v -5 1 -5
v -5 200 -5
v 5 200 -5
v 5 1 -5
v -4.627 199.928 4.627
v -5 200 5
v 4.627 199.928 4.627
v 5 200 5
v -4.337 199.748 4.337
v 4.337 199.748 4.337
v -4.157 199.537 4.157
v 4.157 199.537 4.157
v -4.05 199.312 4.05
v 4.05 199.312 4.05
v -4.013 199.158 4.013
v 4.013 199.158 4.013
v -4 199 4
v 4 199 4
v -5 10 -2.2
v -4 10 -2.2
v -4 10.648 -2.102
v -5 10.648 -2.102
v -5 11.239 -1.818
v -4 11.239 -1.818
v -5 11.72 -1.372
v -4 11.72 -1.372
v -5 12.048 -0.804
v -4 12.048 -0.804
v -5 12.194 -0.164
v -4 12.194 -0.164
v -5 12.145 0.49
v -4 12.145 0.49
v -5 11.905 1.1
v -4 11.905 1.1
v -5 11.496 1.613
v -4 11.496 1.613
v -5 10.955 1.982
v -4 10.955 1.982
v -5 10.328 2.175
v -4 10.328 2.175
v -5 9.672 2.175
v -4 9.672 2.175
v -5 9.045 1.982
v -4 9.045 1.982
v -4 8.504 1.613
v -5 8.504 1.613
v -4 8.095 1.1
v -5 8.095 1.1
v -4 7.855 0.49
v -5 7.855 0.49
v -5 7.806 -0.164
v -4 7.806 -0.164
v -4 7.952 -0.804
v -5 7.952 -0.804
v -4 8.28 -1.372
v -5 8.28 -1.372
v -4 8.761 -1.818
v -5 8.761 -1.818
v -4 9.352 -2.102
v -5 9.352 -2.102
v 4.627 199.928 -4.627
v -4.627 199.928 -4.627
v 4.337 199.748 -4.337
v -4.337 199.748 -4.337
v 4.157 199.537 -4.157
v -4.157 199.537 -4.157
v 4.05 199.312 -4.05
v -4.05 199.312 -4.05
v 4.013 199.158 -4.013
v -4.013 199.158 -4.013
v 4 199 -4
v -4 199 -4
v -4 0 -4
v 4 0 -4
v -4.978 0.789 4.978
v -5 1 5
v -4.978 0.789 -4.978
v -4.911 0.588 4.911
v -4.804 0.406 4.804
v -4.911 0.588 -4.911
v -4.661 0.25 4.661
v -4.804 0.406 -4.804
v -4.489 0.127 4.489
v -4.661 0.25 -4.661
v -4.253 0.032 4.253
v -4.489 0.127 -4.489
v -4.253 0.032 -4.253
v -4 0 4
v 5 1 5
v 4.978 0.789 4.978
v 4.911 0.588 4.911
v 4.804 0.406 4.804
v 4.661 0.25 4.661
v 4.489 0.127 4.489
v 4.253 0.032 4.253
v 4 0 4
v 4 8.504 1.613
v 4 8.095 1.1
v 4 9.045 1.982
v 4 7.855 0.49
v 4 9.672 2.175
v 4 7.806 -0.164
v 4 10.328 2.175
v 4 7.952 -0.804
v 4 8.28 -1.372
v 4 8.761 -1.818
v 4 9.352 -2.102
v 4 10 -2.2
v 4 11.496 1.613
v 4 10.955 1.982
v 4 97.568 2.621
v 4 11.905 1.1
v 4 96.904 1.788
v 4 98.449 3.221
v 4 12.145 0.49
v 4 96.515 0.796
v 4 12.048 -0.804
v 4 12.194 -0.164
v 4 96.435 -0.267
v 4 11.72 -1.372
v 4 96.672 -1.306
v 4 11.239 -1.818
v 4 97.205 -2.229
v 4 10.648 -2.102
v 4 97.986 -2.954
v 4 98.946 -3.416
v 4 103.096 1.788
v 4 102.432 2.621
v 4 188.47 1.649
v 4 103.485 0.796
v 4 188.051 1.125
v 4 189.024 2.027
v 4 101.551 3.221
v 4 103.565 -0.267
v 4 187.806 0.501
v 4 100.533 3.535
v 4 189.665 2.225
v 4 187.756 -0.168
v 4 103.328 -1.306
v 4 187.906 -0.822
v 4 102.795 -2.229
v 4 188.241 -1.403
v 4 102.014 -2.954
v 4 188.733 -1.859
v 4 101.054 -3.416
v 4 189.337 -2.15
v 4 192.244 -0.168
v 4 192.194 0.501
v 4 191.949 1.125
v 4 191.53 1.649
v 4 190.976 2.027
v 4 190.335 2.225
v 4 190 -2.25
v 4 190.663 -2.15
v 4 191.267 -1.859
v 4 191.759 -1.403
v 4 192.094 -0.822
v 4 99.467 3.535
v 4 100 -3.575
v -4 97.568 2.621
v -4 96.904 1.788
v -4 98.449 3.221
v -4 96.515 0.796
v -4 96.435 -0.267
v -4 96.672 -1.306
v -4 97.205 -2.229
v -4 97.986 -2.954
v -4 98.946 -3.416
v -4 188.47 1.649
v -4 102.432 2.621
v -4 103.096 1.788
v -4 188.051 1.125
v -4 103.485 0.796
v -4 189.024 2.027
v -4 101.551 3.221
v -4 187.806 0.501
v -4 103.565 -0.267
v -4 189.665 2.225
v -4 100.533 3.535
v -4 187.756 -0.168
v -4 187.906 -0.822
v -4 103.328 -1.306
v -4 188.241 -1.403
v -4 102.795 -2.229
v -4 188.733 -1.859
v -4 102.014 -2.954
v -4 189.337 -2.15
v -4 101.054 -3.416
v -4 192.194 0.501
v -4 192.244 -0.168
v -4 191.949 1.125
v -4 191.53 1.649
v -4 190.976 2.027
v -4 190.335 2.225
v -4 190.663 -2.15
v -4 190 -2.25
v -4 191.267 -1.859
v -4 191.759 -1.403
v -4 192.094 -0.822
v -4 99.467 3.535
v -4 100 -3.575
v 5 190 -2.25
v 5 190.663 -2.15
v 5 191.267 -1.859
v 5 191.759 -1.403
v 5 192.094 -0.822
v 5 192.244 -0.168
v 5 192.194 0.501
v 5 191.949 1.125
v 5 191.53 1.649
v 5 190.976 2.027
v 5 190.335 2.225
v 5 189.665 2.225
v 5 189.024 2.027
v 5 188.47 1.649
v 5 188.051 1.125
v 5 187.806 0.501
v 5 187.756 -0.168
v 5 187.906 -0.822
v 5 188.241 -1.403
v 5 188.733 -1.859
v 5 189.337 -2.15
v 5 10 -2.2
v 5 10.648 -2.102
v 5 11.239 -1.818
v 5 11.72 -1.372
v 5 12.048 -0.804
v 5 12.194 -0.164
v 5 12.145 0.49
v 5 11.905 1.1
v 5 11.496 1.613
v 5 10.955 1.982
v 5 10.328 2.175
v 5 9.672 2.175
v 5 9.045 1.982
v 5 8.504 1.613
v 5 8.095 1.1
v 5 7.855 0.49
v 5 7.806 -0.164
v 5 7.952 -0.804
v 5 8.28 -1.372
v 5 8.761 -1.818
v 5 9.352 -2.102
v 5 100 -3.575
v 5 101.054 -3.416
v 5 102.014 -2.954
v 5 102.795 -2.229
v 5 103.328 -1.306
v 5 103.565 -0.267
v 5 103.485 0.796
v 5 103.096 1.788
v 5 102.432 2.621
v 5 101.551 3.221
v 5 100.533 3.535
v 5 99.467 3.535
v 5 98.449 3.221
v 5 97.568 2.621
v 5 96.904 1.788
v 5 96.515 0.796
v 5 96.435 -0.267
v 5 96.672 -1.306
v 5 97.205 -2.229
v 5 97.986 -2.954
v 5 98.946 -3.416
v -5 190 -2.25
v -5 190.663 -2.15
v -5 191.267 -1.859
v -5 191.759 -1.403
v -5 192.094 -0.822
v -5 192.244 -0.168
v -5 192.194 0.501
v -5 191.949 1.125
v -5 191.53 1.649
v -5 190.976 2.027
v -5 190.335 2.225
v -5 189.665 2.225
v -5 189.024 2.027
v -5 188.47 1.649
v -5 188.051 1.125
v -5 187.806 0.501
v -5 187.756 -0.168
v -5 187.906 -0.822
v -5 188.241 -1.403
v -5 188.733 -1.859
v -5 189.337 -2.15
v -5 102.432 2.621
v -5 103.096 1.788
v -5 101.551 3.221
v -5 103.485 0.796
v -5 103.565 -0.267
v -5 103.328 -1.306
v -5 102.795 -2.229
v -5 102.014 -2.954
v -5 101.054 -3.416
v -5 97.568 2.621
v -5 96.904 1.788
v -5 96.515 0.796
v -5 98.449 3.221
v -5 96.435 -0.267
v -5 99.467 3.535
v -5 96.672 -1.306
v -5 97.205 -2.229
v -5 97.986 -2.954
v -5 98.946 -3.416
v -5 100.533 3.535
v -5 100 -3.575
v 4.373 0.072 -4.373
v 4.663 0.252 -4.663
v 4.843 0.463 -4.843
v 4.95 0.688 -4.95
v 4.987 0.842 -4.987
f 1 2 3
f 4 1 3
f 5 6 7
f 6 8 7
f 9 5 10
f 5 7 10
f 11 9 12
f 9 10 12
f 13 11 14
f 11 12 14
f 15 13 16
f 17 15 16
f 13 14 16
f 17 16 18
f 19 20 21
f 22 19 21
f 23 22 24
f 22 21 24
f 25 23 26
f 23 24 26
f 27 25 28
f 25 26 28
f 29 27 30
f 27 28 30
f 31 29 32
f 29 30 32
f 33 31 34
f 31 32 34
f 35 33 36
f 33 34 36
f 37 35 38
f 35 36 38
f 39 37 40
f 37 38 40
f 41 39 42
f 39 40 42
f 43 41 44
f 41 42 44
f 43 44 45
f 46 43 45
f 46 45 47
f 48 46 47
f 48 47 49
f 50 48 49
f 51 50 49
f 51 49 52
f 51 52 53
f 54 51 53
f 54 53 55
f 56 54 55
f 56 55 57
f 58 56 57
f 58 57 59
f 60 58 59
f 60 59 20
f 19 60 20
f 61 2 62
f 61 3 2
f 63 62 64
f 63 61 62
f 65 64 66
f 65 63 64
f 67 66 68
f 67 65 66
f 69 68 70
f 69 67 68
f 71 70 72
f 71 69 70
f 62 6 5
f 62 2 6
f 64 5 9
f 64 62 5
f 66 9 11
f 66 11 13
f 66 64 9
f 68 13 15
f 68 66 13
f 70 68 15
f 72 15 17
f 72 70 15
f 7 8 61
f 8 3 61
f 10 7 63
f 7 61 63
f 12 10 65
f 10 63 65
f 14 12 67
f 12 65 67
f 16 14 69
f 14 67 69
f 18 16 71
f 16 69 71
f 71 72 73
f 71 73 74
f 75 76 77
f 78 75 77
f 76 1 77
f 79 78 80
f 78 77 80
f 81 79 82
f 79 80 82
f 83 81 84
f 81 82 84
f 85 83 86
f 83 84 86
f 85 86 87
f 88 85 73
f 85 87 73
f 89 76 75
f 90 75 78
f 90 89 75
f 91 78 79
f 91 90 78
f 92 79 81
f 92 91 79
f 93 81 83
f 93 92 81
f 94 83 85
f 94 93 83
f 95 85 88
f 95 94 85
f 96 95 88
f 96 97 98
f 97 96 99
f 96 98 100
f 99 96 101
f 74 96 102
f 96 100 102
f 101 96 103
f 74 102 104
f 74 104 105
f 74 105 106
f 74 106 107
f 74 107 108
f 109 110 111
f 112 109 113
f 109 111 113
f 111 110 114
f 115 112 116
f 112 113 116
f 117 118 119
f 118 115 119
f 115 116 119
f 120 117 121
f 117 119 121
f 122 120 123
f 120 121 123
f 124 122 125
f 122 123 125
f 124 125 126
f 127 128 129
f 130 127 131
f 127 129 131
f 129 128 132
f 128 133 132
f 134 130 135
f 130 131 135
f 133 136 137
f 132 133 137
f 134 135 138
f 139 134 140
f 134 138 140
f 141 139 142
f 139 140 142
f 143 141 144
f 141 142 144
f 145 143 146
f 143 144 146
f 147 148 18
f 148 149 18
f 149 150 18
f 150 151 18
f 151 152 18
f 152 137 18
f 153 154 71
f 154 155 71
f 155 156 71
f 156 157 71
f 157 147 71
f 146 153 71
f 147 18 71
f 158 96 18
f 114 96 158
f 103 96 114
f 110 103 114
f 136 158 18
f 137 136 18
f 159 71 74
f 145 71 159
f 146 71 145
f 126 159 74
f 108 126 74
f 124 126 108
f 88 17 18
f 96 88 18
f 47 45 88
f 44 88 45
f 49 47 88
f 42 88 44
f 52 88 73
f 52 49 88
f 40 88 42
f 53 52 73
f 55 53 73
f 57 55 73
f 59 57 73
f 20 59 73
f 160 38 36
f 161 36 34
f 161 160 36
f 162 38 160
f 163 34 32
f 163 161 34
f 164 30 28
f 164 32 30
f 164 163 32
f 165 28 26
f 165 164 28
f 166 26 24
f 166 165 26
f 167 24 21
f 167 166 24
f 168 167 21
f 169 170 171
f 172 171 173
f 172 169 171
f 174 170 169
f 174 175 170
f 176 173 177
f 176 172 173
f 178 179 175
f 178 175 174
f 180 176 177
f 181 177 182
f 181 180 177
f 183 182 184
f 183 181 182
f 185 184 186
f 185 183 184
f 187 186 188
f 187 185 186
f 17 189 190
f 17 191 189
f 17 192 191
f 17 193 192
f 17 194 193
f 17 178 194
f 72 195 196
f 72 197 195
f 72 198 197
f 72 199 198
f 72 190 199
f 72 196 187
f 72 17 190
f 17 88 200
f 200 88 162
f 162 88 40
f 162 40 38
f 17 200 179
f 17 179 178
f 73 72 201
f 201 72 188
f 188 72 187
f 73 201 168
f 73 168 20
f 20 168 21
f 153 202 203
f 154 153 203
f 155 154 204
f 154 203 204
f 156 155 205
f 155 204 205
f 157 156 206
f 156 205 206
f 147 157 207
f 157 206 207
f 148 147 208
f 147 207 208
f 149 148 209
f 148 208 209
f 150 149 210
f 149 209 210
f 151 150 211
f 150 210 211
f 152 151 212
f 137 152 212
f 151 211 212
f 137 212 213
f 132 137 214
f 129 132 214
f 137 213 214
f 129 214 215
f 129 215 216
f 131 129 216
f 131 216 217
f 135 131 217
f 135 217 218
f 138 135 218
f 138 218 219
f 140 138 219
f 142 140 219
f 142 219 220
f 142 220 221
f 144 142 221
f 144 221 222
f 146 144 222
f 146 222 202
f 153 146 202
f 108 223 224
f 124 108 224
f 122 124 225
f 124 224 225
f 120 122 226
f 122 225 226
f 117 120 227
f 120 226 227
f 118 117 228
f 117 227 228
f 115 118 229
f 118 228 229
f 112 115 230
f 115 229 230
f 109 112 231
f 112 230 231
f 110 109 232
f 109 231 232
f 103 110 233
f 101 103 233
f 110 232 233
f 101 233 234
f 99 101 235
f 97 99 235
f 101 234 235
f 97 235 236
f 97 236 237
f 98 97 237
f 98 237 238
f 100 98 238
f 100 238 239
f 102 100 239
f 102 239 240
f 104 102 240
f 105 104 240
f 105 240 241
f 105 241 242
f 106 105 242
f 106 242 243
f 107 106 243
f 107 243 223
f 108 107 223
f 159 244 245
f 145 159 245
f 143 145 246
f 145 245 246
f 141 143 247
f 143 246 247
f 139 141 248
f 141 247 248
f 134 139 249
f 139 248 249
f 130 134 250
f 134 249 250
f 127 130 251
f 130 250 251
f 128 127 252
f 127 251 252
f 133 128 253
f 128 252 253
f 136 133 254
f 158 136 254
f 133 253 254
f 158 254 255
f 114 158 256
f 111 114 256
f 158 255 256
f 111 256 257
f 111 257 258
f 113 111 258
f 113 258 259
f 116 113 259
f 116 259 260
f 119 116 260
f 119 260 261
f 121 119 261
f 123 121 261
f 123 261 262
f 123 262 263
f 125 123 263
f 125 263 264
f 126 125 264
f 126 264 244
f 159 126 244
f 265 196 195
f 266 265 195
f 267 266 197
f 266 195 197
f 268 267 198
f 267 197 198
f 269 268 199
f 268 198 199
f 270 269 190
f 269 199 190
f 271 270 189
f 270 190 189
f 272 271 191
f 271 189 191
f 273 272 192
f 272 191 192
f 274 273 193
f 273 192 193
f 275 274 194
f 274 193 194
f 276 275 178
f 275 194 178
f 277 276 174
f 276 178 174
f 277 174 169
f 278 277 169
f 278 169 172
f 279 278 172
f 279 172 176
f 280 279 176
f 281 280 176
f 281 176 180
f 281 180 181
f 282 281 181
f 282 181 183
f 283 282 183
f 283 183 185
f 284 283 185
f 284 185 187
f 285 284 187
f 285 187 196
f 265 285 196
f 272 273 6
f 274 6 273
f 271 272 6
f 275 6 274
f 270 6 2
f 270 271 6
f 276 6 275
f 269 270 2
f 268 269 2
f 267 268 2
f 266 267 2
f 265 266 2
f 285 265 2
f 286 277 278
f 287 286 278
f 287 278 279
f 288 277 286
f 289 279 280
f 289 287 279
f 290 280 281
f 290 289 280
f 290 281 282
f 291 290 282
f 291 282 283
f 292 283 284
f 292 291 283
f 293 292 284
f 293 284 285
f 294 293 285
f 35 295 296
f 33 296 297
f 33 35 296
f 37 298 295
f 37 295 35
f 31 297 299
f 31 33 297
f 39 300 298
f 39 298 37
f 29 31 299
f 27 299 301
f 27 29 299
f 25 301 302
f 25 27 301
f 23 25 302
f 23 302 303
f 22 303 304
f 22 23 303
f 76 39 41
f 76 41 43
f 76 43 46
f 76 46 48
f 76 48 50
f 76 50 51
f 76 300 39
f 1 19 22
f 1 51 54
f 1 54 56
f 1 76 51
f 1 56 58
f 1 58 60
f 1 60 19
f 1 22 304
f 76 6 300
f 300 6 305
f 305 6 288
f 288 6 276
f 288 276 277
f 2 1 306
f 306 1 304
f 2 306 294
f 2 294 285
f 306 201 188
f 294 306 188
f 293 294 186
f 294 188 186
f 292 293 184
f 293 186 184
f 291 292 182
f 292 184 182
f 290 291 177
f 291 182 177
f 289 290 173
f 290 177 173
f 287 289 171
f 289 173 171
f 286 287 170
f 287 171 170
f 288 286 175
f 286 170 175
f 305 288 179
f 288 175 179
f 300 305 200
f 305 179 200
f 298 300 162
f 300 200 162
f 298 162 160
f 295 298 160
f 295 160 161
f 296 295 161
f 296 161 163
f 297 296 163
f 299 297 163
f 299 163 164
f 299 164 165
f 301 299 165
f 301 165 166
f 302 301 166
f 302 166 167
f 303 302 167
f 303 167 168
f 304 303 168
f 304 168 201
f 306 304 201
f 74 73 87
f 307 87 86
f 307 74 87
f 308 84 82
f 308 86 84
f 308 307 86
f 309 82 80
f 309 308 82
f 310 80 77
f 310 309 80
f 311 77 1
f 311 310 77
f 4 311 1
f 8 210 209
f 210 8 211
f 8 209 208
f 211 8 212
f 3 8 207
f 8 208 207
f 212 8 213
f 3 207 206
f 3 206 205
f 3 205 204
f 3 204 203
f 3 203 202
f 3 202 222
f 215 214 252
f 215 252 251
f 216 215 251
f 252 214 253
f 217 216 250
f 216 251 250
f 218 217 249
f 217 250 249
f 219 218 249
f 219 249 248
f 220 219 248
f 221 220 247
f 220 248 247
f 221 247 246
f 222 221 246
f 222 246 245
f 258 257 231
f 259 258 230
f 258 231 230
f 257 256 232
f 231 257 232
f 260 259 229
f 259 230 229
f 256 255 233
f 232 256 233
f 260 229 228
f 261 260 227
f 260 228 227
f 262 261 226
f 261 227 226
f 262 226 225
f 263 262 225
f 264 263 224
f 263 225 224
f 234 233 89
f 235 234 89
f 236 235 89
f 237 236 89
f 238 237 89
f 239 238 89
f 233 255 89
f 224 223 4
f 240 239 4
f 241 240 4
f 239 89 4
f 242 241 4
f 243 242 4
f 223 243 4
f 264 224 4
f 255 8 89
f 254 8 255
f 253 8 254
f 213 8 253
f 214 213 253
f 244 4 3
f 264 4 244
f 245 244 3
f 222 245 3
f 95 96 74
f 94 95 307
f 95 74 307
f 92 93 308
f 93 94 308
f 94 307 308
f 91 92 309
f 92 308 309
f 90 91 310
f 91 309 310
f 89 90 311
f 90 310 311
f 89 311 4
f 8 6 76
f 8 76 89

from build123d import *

# Parameters (mm, degrees)
SKETCH1_W           = 10
SKETCH1_H           = 10
BOSS_EXTRUDE2_DEPTH = 200
SKETCH3_W           = 8
SKETCH3_H           = 8
CUT_EXTRUDE1_DEPTH  = 200
SKETCH4_R           = 3.575
SKETCH4_R_2         = 2.25
SKETCH4_R_3         = 2.2
CUT_EXTRUDE2_DEPTH  = 201.31225624
FILLET1_R           = 1


with BuildPart() as part:
    # Sketch1 → Boss-Extrude2 (new body)
    with BuildSketch(Plane(origin=(0, 0, 0), x_dir=(1, 0, 0), z_dir=(0, 1, 0))):
        Rectangle(SKETCH1_W, SKETCH1_H)
    extrude(amount=BOSS_EXTRUDE2_DEPTH)

    # Sketch3 → Cut-Extrude1 (cut)
    with BuildSketch(Plane(origin=(0, 200, 0), x_dir=(1, 0, 0), z_dir=(0, 1, 0))):
        Rectangle(SKETCH3_W, SKETCH3_H)
    extrude(amount=-CUT_EXTRUDE1_DEPTH, mode=Mode.SUBTRACT)

    # Sketch4 → Cut-Extrude2 (cut, through all)
    with BuildSketch(Plane(origin=(5, 0, 0), x_dir=(0, 0, -1), z_dir=(1, 0, 0))):
        with Locations((0, 100)):
            Circle(SKETCH4_R)
        with Locations((0, 190)):
            Circle(SKETCH4_R_2)
        with Locations((0, 10)):
            Circle(SKETCH4_R_3)
    extrude(amount=-CUT_EXTRUDE2_DEPTH, mode=Mode.SUBTRACT)

    # Fillet1
    fillet1_edges = [part.edges().sort_by_distance(p)[0] for p in [
        (4, 200, 0),
        (0, 200, -4),
        (-4, 200, 0),
        (0, 200, 4),
        (0, 0, 5),
        (-5, 0, 0),
        (0, 0, -5),
        (5, 0, 0),
    ]]
    fillet(fillet1_edges, radius=FILLET1_R - 0.0001)  # a hair under: the kernel refuses the full size


solid = part.part
